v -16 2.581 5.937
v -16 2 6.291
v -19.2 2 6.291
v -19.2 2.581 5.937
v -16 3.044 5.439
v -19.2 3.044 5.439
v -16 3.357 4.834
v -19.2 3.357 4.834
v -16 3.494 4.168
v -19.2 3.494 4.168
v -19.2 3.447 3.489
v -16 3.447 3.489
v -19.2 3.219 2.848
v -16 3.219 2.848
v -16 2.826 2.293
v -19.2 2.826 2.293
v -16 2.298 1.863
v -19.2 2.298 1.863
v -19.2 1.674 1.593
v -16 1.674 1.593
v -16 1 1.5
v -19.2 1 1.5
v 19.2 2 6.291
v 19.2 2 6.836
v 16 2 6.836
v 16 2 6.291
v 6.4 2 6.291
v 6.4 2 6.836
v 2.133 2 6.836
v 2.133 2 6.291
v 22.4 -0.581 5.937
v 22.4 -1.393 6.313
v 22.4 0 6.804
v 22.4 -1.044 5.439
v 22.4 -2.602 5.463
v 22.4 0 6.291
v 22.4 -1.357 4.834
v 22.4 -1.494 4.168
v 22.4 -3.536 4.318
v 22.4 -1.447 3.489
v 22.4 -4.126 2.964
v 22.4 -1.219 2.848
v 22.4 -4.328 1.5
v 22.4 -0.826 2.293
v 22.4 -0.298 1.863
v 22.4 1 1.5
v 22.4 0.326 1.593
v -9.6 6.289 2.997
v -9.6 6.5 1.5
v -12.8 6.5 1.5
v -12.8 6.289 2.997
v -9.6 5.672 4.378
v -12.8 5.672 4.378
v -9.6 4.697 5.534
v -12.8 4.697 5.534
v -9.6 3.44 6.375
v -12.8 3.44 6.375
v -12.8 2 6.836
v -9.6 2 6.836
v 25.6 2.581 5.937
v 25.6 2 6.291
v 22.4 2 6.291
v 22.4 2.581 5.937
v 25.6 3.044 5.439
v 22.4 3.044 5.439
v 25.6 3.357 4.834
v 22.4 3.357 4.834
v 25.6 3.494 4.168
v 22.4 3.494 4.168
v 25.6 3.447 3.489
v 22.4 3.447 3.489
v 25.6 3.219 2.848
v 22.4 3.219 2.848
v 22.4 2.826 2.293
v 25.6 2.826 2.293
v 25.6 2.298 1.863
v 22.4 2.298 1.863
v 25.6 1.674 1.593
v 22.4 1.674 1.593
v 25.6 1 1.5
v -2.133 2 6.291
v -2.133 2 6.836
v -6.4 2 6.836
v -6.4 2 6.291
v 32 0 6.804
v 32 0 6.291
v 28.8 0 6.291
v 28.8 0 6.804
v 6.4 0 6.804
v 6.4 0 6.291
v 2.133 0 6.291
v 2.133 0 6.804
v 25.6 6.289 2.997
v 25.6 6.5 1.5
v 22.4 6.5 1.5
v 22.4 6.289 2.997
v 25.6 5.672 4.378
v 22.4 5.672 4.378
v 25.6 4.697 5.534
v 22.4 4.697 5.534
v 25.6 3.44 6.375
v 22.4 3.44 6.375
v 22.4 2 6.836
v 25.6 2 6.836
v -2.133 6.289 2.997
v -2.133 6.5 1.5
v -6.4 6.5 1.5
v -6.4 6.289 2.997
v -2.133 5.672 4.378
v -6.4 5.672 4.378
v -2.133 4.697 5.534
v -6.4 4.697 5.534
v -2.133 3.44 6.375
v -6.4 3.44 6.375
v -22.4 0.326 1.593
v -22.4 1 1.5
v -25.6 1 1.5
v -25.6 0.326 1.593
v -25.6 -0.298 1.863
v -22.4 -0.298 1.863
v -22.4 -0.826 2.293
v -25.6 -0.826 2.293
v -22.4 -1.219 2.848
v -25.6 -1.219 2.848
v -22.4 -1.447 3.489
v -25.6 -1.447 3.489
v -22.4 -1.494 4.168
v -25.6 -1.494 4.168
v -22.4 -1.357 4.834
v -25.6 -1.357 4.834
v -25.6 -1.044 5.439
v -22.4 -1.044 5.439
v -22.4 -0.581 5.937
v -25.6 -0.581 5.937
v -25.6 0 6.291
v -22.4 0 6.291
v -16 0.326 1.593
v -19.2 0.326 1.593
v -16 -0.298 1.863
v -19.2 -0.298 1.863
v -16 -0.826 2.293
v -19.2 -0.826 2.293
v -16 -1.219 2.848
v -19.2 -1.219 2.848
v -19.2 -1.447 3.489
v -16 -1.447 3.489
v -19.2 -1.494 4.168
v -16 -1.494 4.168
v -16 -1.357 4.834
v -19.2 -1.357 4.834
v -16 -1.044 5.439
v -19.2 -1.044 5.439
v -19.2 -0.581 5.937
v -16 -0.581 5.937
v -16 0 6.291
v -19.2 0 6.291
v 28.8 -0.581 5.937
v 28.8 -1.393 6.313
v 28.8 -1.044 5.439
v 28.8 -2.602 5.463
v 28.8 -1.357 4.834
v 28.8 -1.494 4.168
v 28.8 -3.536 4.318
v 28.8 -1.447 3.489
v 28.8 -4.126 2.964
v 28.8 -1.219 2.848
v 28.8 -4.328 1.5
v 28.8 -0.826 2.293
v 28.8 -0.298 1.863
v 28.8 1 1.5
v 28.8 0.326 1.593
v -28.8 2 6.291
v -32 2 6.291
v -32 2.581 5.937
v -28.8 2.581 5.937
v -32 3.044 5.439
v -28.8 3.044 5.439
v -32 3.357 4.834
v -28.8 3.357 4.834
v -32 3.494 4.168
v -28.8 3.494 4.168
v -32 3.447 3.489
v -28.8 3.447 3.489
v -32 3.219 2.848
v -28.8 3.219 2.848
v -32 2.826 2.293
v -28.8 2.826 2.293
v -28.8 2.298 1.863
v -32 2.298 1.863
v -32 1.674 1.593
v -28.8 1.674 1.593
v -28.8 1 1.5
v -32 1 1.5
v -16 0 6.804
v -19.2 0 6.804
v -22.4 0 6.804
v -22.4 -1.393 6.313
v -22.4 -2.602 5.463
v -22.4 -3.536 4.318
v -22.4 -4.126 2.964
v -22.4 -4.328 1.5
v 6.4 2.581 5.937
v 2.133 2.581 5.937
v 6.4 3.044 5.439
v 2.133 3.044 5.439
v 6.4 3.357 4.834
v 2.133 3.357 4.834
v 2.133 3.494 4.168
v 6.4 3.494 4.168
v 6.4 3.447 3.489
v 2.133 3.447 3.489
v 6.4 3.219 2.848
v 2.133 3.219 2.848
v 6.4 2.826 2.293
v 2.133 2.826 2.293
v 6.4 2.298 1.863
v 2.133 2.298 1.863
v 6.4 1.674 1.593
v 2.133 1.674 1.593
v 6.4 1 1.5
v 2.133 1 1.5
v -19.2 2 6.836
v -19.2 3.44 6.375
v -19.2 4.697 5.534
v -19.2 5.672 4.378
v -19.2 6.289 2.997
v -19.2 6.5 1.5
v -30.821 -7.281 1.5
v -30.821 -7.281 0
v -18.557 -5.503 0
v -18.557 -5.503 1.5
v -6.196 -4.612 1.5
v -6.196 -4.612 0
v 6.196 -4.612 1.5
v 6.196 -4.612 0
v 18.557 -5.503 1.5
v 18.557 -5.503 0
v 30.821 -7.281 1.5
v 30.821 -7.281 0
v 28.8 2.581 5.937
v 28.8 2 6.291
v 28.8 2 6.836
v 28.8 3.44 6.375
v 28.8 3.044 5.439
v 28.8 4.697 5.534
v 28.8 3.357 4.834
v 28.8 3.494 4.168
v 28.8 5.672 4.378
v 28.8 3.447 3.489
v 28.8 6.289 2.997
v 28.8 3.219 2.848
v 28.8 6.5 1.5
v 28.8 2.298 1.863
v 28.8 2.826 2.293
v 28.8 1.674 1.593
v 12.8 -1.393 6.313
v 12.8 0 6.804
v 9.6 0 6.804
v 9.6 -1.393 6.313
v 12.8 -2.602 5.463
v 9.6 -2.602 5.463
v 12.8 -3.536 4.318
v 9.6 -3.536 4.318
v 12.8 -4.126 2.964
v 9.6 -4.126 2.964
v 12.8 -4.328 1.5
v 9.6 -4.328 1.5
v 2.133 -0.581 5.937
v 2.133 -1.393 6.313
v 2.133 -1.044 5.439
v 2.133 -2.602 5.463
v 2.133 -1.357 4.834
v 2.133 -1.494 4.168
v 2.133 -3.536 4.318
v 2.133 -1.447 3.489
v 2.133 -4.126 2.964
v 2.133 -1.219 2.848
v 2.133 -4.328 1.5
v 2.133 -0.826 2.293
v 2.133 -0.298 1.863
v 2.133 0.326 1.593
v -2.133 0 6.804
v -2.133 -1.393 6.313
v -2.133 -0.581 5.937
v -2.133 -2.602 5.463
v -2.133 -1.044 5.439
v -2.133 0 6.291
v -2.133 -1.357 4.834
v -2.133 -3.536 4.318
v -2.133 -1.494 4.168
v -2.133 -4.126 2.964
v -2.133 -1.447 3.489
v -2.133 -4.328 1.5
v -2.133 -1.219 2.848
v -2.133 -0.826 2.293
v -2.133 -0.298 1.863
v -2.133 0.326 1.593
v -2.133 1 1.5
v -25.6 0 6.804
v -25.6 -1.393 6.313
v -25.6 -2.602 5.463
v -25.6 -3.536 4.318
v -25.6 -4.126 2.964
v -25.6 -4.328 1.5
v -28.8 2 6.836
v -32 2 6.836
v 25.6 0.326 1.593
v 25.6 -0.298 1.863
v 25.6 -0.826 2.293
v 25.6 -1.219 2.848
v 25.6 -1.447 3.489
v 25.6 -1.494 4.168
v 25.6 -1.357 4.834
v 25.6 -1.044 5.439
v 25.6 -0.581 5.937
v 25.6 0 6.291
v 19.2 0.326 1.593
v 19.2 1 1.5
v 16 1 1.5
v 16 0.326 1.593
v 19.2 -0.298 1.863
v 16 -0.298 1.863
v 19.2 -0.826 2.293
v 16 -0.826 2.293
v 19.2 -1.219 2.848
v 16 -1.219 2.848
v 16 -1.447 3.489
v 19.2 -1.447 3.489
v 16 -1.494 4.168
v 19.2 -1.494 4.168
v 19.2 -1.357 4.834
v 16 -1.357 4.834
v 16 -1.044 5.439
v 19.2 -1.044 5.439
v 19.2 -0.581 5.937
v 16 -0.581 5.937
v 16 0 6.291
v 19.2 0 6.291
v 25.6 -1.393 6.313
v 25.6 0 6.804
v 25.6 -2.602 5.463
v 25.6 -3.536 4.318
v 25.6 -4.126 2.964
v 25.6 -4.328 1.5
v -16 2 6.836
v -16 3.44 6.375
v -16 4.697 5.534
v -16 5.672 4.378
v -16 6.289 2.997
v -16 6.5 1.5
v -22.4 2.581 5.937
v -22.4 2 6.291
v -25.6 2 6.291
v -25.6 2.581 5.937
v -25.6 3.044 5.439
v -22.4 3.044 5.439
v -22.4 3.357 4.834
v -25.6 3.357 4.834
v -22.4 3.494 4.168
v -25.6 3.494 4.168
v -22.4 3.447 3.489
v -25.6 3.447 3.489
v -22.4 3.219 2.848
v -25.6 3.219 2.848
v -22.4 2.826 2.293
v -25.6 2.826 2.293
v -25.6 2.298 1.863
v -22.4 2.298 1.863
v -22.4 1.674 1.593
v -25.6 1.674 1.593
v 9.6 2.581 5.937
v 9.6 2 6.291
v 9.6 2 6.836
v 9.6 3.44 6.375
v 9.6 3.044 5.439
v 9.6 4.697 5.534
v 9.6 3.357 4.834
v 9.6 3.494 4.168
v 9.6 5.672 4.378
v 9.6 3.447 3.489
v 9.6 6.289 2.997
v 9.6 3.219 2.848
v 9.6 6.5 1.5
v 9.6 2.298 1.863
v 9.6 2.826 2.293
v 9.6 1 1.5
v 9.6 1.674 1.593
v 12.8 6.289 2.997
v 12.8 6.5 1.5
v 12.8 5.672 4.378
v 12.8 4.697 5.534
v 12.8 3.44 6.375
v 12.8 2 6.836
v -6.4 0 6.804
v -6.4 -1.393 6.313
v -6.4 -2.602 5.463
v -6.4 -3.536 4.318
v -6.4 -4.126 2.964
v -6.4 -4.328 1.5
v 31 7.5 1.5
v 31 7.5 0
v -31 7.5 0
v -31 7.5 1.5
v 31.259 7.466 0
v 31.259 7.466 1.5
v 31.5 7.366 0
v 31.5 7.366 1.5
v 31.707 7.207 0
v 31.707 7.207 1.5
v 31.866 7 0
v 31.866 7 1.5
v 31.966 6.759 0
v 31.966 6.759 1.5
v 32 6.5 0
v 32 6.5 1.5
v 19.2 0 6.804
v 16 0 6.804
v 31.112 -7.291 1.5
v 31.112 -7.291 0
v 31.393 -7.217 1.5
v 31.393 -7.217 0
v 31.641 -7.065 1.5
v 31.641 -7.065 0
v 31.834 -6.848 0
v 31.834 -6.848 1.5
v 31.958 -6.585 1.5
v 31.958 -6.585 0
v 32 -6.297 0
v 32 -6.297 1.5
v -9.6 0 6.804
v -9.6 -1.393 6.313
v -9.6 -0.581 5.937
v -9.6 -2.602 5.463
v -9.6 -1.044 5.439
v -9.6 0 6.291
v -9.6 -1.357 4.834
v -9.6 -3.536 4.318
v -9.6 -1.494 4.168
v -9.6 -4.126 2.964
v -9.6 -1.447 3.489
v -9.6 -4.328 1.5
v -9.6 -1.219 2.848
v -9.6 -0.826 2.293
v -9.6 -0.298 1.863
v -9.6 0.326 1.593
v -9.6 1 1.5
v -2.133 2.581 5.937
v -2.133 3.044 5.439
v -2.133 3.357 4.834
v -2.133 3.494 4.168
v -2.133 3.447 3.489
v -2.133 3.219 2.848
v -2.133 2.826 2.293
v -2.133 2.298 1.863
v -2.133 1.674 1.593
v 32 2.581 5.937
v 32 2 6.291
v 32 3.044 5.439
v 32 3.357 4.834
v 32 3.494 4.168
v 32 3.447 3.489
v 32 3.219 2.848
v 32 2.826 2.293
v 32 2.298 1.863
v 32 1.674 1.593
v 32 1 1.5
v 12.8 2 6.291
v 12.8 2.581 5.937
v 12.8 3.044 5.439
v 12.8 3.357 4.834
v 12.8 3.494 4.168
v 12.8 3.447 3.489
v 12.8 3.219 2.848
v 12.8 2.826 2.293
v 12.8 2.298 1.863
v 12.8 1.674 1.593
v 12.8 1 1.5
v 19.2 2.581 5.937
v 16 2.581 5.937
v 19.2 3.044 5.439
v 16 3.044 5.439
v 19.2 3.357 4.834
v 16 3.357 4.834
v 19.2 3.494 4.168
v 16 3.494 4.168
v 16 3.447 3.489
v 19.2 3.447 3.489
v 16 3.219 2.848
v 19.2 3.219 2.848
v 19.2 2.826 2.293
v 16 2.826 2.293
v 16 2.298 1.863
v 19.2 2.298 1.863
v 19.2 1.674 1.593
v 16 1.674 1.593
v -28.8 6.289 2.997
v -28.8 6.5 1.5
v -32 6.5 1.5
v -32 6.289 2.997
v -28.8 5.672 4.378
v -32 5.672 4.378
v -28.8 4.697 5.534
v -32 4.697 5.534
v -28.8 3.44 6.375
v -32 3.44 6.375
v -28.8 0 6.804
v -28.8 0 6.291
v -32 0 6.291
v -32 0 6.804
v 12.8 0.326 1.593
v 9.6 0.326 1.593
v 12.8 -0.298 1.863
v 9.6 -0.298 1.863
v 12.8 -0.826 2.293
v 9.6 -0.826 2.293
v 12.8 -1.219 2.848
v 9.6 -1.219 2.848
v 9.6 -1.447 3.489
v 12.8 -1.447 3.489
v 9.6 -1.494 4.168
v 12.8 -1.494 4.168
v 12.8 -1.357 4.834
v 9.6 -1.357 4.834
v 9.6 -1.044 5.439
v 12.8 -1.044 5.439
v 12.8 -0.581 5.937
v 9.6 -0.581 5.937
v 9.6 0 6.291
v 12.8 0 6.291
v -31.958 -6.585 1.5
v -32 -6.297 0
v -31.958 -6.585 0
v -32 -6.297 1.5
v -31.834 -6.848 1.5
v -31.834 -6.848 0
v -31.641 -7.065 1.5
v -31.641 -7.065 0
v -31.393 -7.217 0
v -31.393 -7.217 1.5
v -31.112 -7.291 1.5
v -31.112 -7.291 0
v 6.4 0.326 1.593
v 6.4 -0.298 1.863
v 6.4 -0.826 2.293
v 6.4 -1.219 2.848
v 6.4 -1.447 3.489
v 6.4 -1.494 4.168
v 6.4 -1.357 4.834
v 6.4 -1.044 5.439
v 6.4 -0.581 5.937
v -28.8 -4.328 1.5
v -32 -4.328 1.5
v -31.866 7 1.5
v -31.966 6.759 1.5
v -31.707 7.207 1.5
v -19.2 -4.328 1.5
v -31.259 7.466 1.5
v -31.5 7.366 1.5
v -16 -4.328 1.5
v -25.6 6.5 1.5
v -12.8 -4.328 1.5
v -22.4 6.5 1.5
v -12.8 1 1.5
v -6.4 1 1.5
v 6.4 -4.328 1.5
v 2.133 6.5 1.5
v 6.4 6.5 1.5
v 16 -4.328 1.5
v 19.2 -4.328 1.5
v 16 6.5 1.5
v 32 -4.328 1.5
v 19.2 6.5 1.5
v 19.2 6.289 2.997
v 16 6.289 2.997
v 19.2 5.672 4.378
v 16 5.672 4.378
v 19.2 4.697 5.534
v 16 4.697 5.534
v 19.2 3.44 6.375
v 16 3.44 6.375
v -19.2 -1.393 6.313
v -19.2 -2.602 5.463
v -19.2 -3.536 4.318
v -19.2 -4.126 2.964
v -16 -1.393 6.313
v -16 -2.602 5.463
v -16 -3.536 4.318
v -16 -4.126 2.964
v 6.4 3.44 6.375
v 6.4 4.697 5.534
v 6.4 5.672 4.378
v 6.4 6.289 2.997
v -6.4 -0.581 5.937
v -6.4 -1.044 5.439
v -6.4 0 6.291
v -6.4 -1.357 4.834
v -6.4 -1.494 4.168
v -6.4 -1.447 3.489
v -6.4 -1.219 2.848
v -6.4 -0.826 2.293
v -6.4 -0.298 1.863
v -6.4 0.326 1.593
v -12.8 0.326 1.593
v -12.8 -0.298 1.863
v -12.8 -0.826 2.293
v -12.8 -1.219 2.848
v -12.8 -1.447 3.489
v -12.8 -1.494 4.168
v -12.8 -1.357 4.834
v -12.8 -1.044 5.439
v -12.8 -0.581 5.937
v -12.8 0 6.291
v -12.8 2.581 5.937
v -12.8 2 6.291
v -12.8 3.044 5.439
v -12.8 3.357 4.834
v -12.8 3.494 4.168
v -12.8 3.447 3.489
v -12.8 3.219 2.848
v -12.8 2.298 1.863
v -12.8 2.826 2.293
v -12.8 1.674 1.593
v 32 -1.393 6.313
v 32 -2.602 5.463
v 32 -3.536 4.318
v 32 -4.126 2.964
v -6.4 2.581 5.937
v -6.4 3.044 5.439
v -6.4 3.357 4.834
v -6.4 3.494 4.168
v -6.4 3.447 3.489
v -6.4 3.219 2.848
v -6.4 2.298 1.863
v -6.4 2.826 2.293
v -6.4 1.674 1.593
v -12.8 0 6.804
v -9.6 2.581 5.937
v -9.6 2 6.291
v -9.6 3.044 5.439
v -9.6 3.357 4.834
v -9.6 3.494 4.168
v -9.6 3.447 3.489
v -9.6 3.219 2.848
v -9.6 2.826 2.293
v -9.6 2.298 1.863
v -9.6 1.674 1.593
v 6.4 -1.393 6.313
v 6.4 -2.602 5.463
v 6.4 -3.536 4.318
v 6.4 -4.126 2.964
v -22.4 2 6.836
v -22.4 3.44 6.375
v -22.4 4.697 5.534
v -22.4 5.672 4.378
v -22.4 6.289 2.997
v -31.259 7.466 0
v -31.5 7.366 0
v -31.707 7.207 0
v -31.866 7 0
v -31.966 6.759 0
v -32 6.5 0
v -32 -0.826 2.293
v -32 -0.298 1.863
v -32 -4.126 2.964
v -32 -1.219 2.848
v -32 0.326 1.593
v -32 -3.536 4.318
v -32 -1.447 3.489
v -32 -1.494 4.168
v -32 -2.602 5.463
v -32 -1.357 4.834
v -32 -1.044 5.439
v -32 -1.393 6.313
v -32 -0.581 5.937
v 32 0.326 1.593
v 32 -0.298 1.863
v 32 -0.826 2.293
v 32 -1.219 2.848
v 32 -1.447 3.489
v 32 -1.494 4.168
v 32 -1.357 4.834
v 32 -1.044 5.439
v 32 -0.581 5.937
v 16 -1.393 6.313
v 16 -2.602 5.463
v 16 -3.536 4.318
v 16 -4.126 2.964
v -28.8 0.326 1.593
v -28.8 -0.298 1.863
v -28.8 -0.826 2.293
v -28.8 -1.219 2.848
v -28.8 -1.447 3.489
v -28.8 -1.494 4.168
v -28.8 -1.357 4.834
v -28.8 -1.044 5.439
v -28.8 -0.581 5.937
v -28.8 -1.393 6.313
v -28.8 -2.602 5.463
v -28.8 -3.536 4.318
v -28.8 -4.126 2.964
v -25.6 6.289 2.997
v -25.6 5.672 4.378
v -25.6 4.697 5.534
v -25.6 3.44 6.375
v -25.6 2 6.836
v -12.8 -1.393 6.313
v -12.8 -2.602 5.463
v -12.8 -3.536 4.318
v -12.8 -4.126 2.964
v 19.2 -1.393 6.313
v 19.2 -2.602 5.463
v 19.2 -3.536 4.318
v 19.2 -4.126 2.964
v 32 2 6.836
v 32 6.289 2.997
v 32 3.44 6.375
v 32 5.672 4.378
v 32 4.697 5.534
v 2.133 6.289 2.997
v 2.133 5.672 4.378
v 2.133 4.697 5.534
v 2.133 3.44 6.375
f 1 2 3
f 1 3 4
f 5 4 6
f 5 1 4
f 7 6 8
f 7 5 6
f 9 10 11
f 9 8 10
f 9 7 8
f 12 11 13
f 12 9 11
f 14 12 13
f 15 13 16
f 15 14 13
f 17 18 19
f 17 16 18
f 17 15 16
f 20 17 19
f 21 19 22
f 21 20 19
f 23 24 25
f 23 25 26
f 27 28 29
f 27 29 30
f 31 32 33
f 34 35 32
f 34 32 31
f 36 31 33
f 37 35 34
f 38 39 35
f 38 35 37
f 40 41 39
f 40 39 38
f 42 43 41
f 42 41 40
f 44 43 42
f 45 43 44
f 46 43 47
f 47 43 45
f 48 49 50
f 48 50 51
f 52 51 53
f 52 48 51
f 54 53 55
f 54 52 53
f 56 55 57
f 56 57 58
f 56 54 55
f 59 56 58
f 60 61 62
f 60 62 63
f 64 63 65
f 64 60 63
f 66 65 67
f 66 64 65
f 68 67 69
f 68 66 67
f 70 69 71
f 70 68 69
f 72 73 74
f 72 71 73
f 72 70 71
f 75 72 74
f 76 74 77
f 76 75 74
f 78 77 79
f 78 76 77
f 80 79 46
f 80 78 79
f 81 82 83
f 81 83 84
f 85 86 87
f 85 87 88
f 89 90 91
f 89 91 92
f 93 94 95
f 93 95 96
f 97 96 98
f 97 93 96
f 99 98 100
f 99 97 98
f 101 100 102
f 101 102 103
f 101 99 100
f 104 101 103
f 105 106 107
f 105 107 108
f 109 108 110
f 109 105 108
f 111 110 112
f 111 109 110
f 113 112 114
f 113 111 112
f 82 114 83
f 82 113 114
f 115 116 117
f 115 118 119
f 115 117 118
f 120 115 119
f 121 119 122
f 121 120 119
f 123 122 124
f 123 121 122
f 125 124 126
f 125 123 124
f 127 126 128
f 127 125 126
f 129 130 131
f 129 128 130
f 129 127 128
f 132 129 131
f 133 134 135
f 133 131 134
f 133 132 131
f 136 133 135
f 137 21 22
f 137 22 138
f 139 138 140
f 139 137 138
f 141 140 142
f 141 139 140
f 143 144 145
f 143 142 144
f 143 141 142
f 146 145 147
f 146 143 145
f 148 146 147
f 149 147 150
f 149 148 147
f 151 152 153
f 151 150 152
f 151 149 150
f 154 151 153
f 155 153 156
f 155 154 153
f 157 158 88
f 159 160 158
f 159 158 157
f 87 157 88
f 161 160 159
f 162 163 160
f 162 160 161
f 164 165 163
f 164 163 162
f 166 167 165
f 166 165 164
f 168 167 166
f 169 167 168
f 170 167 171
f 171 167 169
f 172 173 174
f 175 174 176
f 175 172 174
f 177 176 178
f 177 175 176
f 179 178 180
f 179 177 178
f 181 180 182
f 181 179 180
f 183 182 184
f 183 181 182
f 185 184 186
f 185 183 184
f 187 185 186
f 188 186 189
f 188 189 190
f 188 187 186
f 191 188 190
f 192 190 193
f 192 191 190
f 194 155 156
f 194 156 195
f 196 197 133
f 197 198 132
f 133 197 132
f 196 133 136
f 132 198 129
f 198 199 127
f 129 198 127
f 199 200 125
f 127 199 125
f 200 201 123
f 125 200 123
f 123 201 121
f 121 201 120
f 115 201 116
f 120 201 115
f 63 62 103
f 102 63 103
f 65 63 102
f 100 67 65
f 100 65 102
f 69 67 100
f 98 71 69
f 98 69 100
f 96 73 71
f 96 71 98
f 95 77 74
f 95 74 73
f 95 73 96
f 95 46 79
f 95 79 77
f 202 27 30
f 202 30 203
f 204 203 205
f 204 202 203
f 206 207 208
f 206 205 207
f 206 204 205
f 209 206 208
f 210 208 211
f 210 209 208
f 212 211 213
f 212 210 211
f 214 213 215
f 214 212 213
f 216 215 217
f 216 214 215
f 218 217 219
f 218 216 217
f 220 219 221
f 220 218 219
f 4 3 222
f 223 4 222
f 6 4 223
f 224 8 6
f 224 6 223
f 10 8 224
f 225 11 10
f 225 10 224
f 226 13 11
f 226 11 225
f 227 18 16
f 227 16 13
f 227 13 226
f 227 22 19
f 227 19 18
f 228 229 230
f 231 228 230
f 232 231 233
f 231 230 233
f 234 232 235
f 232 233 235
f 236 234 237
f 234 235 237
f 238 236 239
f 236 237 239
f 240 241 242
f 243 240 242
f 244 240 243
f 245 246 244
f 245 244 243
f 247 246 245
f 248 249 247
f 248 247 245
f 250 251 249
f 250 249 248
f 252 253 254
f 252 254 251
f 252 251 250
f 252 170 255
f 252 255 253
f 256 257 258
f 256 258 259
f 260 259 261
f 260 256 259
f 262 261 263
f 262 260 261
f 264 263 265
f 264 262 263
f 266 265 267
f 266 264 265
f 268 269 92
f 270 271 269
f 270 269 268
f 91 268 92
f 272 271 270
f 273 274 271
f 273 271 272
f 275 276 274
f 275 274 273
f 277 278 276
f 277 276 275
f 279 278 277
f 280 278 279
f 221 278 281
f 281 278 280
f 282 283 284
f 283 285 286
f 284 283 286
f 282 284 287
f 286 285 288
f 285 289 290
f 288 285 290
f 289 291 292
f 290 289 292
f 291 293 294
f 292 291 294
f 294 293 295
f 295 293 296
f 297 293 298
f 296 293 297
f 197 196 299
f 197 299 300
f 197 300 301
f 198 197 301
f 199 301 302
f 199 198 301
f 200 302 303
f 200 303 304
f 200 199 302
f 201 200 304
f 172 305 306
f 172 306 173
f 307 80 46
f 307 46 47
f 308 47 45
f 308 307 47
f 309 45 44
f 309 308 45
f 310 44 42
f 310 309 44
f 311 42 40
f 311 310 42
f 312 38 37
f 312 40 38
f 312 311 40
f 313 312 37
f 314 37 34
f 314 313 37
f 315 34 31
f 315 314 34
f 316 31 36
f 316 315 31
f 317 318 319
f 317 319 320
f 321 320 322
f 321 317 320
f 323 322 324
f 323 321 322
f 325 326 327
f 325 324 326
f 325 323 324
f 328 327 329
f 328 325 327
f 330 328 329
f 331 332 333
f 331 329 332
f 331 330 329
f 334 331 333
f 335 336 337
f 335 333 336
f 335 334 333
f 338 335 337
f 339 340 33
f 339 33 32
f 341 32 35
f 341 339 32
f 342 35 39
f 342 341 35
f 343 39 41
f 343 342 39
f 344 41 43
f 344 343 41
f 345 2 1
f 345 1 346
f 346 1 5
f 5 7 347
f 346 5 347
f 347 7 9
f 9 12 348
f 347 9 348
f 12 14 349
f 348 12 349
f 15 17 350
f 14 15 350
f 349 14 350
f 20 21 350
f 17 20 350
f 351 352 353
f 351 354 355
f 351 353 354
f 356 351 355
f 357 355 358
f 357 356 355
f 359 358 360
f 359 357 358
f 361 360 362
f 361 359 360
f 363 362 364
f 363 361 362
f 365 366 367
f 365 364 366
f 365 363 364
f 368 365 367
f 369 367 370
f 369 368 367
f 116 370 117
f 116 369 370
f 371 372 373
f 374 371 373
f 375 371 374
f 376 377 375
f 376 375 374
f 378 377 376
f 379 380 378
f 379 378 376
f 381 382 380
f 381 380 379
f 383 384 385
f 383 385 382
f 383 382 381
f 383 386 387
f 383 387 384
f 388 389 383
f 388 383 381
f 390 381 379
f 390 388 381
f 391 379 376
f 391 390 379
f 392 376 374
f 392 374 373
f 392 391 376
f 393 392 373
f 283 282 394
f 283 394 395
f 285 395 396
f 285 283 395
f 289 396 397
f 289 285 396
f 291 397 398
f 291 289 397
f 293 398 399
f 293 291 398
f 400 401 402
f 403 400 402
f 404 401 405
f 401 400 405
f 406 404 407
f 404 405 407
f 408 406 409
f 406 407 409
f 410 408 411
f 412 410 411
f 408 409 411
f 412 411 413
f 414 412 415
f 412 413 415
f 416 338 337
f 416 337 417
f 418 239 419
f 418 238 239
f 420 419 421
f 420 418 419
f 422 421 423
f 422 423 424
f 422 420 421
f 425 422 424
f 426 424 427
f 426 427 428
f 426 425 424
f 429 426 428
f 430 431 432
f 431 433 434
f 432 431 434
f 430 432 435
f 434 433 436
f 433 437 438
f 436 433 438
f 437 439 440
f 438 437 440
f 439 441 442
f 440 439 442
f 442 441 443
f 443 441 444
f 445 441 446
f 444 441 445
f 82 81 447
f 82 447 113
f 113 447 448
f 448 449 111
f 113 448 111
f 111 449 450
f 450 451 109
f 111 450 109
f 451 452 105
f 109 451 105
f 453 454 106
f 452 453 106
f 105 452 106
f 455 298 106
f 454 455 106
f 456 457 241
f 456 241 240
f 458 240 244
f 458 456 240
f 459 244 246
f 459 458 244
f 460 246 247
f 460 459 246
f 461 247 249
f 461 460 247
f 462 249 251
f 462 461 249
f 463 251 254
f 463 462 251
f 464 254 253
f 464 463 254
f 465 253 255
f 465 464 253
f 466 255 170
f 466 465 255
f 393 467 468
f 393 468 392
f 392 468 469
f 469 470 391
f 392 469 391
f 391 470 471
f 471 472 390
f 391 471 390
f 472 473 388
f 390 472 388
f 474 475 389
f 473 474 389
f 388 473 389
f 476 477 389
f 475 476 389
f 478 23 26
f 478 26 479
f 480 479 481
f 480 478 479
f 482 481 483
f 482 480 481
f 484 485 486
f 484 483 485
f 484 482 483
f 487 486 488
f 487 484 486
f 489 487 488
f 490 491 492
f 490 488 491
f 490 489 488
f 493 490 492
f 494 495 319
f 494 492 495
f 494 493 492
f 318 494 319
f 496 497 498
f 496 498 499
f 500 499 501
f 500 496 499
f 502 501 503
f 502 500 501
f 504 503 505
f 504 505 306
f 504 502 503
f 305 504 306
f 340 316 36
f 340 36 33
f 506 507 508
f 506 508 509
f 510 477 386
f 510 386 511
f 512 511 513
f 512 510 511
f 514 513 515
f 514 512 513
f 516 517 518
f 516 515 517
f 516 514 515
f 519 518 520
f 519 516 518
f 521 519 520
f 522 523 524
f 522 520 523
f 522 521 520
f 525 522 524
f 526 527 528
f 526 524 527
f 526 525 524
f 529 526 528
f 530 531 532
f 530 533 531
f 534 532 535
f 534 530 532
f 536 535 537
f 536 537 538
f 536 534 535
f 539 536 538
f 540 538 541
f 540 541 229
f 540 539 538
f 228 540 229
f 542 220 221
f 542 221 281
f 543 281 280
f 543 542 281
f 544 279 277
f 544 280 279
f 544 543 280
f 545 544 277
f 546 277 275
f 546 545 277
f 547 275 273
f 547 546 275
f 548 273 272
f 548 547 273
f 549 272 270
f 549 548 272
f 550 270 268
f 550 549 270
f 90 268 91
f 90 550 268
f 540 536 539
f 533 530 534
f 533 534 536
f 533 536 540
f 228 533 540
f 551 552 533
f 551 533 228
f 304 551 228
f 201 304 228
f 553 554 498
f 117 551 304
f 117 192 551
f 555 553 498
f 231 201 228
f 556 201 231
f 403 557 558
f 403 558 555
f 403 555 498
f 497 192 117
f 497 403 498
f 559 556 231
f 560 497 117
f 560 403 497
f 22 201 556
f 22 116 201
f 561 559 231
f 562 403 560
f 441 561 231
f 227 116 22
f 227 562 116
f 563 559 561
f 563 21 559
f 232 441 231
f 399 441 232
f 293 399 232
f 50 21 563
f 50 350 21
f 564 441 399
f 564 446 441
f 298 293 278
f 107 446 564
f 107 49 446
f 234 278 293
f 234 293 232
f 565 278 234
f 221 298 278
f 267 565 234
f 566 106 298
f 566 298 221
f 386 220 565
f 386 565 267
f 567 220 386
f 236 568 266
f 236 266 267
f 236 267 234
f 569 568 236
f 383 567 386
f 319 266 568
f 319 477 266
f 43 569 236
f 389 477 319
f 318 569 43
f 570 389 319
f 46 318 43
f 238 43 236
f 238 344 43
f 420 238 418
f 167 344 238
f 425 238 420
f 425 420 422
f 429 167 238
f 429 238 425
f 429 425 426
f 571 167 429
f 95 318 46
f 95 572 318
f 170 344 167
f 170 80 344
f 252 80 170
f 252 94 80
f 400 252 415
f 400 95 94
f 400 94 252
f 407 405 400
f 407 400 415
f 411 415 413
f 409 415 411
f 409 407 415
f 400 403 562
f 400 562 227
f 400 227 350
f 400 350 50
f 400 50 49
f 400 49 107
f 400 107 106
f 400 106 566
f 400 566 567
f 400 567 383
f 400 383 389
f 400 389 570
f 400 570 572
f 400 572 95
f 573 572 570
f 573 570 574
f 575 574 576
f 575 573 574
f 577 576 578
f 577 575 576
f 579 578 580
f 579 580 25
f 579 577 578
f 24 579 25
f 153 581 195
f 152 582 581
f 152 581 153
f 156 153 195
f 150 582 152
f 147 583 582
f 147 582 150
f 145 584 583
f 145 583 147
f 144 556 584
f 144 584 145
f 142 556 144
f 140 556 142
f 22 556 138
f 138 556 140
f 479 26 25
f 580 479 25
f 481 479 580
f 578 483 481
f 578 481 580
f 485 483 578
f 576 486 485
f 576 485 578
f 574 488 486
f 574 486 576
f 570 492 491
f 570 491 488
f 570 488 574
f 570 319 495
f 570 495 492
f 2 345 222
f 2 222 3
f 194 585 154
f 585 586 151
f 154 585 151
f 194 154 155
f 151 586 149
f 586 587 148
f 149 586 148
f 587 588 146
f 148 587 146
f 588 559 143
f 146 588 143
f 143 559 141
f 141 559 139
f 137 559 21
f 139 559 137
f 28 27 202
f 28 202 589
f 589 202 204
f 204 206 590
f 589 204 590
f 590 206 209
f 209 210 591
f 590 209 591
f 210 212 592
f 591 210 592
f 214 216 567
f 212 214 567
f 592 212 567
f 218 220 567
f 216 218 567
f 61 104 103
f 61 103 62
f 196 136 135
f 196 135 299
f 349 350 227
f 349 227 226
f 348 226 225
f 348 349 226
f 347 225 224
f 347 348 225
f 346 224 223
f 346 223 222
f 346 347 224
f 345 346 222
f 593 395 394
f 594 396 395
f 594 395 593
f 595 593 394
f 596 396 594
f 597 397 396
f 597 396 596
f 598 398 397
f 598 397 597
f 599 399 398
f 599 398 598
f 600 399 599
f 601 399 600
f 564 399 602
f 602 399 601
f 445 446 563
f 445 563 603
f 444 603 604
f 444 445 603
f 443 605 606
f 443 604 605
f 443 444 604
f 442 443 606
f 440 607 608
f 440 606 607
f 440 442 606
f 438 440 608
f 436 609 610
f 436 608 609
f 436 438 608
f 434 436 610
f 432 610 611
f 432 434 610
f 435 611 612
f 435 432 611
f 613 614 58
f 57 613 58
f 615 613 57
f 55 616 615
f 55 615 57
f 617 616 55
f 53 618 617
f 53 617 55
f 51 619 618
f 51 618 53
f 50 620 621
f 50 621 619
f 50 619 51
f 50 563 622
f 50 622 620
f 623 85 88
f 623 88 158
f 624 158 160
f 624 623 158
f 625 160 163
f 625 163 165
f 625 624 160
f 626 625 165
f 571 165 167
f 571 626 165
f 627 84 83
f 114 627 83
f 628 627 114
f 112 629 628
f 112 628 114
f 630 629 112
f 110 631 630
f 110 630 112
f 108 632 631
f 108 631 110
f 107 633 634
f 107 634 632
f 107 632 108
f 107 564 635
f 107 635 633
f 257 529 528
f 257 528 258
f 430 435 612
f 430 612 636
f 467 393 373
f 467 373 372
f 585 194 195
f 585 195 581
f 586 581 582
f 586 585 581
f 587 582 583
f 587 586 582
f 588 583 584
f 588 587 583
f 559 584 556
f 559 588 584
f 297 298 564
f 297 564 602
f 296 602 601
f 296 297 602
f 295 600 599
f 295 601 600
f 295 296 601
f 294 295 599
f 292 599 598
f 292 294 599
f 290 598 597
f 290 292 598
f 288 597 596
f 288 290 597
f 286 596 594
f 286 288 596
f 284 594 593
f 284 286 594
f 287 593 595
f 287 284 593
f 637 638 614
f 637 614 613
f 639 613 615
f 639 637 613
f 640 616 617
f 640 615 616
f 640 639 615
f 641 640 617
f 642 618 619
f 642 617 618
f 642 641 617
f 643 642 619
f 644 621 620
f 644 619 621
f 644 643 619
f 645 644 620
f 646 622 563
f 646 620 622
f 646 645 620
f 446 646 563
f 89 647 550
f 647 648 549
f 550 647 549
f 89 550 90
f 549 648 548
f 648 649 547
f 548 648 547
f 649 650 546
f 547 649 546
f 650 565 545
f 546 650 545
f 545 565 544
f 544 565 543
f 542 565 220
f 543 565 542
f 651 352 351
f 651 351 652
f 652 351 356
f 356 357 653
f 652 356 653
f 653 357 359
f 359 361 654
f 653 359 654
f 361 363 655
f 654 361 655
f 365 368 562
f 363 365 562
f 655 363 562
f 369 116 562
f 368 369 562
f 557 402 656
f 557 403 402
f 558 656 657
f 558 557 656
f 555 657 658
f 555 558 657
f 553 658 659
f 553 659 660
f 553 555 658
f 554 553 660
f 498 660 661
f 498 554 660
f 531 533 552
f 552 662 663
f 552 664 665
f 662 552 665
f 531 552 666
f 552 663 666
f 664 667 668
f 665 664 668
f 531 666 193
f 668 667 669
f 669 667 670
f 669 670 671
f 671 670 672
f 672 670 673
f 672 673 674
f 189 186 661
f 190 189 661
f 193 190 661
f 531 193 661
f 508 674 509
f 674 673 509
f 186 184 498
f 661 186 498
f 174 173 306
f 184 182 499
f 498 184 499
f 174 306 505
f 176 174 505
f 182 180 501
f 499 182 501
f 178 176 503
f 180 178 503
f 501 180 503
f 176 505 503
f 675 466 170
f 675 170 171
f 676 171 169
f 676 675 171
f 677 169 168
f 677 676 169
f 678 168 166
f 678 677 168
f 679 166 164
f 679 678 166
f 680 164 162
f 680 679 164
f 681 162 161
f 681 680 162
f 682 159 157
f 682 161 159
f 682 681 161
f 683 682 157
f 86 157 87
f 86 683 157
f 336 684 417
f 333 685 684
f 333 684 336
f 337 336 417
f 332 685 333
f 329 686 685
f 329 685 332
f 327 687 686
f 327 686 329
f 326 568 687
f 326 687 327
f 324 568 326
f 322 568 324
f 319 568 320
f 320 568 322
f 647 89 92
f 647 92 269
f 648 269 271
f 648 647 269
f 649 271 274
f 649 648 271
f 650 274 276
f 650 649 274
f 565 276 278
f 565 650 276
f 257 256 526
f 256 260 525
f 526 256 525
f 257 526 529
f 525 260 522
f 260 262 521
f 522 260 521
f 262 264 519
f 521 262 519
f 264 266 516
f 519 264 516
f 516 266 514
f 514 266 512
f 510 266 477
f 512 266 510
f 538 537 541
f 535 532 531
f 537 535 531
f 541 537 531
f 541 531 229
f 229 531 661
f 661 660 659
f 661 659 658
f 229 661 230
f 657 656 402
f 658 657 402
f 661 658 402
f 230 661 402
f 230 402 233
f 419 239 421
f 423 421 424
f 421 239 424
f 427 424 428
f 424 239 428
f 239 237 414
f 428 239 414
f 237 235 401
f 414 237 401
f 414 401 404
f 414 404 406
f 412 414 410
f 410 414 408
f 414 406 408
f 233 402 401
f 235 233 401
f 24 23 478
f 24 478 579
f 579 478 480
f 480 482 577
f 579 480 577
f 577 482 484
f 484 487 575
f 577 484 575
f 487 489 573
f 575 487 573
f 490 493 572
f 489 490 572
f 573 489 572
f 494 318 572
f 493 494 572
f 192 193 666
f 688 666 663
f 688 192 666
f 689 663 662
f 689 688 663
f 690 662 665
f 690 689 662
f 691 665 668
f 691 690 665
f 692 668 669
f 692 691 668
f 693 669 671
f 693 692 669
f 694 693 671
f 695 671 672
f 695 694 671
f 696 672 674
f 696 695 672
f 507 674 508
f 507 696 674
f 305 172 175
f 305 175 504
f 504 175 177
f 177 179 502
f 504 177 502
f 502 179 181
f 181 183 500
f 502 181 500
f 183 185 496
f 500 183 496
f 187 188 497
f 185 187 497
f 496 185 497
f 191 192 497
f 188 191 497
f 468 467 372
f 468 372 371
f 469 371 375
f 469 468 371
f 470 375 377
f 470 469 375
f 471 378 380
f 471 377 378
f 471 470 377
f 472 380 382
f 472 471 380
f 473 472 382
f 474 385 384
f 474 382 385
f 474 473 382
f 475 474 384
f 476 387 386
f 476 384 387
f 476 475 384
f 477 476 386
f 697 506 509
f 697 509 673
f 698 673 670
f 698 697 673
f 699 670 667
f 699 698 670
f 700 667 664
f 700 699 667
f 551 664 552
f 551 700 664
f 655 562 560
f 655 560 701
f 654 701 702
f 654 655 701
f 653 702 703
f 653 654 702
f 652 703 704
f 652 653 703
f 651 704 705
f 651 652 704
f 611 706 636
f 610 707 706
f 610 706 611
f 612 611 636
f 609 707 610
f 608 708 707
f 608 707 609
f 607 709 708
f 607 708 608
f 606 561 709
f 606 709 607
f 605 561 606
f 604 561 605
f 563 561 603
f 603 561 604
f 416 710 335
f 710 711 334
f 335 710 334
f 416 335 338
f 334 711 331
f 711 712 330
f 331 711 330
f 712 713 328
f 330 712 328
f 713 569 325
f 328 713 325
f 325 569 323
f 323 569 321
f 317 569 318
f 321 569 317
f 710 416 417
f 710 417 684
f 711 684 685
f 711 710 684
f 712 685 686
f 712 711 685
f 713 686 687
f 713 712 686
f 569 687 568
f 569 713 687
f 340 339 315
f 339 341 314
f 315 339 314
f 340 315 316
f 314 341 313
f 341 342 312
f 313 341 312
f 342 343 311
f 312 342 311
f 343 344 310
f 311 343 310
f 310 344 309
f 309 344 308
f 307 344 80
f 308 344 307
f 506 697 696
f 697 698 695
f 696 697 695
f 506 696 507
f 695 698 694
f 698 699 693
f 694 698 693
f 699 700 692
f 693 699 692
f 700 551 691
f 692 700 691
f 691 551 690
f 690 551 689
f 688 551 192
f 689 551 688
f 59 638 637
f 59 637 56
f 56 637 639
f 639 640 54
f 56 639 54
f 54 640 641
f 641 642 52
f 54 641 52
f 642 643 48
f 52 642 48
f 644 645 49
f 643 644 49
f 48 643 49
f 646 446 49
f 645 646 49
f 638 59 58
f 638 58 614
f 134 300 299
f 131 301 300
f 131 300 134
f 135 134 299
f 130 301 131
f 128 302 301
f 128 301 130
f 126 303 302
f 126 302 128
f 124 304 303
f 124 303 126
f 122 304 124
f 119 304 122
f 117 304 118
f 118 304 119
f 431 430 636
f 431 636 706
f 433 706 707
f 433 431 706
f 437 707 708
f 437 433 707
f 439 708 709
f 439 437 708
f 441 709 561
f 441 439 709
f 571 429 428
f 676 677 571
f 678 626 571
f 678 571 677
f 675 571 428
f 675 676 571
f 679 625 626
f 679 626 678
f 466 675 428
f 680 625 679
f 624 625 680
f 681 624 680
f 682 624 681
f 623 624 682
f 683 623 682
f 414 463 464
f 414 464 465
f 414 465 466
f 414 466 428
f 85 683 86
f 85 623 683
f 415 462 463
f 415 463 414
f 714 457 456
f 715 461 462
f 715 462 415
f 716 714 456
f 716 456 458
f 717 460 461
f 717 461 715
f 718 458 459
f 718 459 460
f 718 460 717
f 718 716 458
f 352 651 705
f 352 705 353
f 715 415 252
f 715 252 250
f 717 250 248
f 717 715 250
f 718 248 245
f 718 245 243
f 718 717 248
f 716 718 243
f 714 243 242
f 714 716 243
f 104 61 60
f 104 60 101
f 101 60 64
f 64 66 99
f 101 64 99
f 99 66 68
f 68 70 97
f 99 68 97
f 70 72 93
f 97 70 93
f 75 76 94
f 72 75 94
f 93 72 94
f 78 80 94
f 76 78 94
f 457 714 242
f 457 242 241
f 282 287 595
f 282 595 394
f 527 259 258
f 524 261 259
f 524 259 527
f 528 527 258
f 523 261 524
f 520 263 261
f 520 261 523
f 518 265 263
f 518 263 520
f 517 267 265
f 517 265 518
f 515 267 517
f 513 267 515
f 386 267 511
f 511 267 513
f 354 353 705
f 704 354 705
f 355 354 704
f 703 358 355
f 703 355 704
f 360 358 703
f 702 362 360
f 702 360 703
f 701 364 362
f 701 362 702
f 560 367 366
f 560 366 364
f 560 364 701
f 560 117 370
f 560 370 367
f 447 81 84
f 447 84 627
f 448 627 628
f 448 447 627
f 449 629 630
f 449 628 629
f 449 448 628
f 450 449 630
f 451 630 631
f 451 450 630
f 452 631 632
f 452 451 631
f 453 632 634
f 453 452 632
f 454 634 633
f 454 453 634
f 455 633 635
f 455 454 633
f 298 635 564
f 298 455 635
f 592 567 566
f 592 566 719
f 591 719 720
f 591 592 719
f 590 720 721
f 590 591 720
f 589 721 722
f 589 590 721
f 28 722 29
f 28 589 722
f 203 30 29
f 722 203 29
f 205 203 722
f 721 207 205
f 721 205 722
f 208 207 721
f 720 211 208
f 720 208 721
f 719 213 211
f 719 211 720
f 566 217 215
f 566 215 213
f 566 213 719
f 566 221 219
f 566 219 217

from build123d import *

# Parameters (mm, degrees)
F1_DEPTH = 1.5
F2_R     = 1
F4_DEPTH = 64
F5_W     = 4.266666
F5_H     = 13.671578
F5_W_2   = 3.2
F6_DEPTH = 7.7216


with BuildPart() as f1:
    # F0 (on Top) → F1 (new body)
    with BuildSketch(Plane.XY):
        with BuildLine():
            Line((32, 7.5), (-32, 7.5))
            Line((-32, 7.5), (-32, -7.5))
            ThreePointArc((-32, -7.5), (0, -4.5), (32, -7.5))
            Line((32, -7.5), (32, 7.5))
        make_face()
    extrude(amount=F1_DEPTH)

    # F2
    f2_edges = [f1.edges().sort_by_distance(p)[0] for p in [
        (32, 7.5, 0.75),
        (32, -7.5, 0.75),
        (-32, -7.5, 0.75),
        (-32, 7.5, 0.75),
    ]]
    fillet(f2_edges, radius=F2_R)

    # F3 (on face) → F4 (join)
    with BuildSketch(Plane.YZ.offset(32)):
        with BuildLine():
            ThreePointArc((1, 1.5), (-1.447266, 3.489226), (0, 6.291288))
            Line((0, 6.291288), (0, 6.803734))
            ThreePointArc((0, 6.803734), (-3.108438, 4.922642), (-4.327623, 1.5))
            Line((-4.327623, 1.5), (1, 1.5))
        make_face()
        with BuildLine():
            ThreePointArc((2, 6.291288), (3.447266, 3.489226), (1, 1.5))
            Line((1, 1.5), (6.5, 1.5))
            ThreePointArc((6.5, 1.5), (5.224821, 4.990141), (2, 6.836136))
            Line((2, 6.836136), (2, 6.291288))
        make_face()
    extrude(amount=-F4_DEPTH)

    # F5 (on face) → F6 (cut)
    with BuildSketch(Plane.XY.offset(1.5)):
        with Locations((0, 2.508166)):
            Rectangle(F5_W, F5_H)
        with Locations((-8, 2.508166)):
            Rectangle(F5_W_2, F5_H)
        with Locations((-14.4, 2.508166)):
            Rectangle(F5_W_2, F5_H)
        with Locations((-20.8, 2.508166)):
            Rectangle(F5_W_2, F5_H)
        with Locations((-27.2, 2.508166)):
            Rectangle(F5_W_2, F5_H)
        with Locations((8, 2.508166)):
            Rectangle(F5_W_2, F5_H)
        with Locations((14.4, 2.508166)):
            Rectangle(F5_W_2, F5_H)
        with Locations((20.8, 2.508166)):
            Rectangle(F5_W_2, F5_H)
        with Locations((27.2, 2.508166)):
            Rectangle(F5_W_2, F5_H)
    extrude(amount=F6_DEPTH, mode=Mode.SUBTRACT)


solid = f1.part
